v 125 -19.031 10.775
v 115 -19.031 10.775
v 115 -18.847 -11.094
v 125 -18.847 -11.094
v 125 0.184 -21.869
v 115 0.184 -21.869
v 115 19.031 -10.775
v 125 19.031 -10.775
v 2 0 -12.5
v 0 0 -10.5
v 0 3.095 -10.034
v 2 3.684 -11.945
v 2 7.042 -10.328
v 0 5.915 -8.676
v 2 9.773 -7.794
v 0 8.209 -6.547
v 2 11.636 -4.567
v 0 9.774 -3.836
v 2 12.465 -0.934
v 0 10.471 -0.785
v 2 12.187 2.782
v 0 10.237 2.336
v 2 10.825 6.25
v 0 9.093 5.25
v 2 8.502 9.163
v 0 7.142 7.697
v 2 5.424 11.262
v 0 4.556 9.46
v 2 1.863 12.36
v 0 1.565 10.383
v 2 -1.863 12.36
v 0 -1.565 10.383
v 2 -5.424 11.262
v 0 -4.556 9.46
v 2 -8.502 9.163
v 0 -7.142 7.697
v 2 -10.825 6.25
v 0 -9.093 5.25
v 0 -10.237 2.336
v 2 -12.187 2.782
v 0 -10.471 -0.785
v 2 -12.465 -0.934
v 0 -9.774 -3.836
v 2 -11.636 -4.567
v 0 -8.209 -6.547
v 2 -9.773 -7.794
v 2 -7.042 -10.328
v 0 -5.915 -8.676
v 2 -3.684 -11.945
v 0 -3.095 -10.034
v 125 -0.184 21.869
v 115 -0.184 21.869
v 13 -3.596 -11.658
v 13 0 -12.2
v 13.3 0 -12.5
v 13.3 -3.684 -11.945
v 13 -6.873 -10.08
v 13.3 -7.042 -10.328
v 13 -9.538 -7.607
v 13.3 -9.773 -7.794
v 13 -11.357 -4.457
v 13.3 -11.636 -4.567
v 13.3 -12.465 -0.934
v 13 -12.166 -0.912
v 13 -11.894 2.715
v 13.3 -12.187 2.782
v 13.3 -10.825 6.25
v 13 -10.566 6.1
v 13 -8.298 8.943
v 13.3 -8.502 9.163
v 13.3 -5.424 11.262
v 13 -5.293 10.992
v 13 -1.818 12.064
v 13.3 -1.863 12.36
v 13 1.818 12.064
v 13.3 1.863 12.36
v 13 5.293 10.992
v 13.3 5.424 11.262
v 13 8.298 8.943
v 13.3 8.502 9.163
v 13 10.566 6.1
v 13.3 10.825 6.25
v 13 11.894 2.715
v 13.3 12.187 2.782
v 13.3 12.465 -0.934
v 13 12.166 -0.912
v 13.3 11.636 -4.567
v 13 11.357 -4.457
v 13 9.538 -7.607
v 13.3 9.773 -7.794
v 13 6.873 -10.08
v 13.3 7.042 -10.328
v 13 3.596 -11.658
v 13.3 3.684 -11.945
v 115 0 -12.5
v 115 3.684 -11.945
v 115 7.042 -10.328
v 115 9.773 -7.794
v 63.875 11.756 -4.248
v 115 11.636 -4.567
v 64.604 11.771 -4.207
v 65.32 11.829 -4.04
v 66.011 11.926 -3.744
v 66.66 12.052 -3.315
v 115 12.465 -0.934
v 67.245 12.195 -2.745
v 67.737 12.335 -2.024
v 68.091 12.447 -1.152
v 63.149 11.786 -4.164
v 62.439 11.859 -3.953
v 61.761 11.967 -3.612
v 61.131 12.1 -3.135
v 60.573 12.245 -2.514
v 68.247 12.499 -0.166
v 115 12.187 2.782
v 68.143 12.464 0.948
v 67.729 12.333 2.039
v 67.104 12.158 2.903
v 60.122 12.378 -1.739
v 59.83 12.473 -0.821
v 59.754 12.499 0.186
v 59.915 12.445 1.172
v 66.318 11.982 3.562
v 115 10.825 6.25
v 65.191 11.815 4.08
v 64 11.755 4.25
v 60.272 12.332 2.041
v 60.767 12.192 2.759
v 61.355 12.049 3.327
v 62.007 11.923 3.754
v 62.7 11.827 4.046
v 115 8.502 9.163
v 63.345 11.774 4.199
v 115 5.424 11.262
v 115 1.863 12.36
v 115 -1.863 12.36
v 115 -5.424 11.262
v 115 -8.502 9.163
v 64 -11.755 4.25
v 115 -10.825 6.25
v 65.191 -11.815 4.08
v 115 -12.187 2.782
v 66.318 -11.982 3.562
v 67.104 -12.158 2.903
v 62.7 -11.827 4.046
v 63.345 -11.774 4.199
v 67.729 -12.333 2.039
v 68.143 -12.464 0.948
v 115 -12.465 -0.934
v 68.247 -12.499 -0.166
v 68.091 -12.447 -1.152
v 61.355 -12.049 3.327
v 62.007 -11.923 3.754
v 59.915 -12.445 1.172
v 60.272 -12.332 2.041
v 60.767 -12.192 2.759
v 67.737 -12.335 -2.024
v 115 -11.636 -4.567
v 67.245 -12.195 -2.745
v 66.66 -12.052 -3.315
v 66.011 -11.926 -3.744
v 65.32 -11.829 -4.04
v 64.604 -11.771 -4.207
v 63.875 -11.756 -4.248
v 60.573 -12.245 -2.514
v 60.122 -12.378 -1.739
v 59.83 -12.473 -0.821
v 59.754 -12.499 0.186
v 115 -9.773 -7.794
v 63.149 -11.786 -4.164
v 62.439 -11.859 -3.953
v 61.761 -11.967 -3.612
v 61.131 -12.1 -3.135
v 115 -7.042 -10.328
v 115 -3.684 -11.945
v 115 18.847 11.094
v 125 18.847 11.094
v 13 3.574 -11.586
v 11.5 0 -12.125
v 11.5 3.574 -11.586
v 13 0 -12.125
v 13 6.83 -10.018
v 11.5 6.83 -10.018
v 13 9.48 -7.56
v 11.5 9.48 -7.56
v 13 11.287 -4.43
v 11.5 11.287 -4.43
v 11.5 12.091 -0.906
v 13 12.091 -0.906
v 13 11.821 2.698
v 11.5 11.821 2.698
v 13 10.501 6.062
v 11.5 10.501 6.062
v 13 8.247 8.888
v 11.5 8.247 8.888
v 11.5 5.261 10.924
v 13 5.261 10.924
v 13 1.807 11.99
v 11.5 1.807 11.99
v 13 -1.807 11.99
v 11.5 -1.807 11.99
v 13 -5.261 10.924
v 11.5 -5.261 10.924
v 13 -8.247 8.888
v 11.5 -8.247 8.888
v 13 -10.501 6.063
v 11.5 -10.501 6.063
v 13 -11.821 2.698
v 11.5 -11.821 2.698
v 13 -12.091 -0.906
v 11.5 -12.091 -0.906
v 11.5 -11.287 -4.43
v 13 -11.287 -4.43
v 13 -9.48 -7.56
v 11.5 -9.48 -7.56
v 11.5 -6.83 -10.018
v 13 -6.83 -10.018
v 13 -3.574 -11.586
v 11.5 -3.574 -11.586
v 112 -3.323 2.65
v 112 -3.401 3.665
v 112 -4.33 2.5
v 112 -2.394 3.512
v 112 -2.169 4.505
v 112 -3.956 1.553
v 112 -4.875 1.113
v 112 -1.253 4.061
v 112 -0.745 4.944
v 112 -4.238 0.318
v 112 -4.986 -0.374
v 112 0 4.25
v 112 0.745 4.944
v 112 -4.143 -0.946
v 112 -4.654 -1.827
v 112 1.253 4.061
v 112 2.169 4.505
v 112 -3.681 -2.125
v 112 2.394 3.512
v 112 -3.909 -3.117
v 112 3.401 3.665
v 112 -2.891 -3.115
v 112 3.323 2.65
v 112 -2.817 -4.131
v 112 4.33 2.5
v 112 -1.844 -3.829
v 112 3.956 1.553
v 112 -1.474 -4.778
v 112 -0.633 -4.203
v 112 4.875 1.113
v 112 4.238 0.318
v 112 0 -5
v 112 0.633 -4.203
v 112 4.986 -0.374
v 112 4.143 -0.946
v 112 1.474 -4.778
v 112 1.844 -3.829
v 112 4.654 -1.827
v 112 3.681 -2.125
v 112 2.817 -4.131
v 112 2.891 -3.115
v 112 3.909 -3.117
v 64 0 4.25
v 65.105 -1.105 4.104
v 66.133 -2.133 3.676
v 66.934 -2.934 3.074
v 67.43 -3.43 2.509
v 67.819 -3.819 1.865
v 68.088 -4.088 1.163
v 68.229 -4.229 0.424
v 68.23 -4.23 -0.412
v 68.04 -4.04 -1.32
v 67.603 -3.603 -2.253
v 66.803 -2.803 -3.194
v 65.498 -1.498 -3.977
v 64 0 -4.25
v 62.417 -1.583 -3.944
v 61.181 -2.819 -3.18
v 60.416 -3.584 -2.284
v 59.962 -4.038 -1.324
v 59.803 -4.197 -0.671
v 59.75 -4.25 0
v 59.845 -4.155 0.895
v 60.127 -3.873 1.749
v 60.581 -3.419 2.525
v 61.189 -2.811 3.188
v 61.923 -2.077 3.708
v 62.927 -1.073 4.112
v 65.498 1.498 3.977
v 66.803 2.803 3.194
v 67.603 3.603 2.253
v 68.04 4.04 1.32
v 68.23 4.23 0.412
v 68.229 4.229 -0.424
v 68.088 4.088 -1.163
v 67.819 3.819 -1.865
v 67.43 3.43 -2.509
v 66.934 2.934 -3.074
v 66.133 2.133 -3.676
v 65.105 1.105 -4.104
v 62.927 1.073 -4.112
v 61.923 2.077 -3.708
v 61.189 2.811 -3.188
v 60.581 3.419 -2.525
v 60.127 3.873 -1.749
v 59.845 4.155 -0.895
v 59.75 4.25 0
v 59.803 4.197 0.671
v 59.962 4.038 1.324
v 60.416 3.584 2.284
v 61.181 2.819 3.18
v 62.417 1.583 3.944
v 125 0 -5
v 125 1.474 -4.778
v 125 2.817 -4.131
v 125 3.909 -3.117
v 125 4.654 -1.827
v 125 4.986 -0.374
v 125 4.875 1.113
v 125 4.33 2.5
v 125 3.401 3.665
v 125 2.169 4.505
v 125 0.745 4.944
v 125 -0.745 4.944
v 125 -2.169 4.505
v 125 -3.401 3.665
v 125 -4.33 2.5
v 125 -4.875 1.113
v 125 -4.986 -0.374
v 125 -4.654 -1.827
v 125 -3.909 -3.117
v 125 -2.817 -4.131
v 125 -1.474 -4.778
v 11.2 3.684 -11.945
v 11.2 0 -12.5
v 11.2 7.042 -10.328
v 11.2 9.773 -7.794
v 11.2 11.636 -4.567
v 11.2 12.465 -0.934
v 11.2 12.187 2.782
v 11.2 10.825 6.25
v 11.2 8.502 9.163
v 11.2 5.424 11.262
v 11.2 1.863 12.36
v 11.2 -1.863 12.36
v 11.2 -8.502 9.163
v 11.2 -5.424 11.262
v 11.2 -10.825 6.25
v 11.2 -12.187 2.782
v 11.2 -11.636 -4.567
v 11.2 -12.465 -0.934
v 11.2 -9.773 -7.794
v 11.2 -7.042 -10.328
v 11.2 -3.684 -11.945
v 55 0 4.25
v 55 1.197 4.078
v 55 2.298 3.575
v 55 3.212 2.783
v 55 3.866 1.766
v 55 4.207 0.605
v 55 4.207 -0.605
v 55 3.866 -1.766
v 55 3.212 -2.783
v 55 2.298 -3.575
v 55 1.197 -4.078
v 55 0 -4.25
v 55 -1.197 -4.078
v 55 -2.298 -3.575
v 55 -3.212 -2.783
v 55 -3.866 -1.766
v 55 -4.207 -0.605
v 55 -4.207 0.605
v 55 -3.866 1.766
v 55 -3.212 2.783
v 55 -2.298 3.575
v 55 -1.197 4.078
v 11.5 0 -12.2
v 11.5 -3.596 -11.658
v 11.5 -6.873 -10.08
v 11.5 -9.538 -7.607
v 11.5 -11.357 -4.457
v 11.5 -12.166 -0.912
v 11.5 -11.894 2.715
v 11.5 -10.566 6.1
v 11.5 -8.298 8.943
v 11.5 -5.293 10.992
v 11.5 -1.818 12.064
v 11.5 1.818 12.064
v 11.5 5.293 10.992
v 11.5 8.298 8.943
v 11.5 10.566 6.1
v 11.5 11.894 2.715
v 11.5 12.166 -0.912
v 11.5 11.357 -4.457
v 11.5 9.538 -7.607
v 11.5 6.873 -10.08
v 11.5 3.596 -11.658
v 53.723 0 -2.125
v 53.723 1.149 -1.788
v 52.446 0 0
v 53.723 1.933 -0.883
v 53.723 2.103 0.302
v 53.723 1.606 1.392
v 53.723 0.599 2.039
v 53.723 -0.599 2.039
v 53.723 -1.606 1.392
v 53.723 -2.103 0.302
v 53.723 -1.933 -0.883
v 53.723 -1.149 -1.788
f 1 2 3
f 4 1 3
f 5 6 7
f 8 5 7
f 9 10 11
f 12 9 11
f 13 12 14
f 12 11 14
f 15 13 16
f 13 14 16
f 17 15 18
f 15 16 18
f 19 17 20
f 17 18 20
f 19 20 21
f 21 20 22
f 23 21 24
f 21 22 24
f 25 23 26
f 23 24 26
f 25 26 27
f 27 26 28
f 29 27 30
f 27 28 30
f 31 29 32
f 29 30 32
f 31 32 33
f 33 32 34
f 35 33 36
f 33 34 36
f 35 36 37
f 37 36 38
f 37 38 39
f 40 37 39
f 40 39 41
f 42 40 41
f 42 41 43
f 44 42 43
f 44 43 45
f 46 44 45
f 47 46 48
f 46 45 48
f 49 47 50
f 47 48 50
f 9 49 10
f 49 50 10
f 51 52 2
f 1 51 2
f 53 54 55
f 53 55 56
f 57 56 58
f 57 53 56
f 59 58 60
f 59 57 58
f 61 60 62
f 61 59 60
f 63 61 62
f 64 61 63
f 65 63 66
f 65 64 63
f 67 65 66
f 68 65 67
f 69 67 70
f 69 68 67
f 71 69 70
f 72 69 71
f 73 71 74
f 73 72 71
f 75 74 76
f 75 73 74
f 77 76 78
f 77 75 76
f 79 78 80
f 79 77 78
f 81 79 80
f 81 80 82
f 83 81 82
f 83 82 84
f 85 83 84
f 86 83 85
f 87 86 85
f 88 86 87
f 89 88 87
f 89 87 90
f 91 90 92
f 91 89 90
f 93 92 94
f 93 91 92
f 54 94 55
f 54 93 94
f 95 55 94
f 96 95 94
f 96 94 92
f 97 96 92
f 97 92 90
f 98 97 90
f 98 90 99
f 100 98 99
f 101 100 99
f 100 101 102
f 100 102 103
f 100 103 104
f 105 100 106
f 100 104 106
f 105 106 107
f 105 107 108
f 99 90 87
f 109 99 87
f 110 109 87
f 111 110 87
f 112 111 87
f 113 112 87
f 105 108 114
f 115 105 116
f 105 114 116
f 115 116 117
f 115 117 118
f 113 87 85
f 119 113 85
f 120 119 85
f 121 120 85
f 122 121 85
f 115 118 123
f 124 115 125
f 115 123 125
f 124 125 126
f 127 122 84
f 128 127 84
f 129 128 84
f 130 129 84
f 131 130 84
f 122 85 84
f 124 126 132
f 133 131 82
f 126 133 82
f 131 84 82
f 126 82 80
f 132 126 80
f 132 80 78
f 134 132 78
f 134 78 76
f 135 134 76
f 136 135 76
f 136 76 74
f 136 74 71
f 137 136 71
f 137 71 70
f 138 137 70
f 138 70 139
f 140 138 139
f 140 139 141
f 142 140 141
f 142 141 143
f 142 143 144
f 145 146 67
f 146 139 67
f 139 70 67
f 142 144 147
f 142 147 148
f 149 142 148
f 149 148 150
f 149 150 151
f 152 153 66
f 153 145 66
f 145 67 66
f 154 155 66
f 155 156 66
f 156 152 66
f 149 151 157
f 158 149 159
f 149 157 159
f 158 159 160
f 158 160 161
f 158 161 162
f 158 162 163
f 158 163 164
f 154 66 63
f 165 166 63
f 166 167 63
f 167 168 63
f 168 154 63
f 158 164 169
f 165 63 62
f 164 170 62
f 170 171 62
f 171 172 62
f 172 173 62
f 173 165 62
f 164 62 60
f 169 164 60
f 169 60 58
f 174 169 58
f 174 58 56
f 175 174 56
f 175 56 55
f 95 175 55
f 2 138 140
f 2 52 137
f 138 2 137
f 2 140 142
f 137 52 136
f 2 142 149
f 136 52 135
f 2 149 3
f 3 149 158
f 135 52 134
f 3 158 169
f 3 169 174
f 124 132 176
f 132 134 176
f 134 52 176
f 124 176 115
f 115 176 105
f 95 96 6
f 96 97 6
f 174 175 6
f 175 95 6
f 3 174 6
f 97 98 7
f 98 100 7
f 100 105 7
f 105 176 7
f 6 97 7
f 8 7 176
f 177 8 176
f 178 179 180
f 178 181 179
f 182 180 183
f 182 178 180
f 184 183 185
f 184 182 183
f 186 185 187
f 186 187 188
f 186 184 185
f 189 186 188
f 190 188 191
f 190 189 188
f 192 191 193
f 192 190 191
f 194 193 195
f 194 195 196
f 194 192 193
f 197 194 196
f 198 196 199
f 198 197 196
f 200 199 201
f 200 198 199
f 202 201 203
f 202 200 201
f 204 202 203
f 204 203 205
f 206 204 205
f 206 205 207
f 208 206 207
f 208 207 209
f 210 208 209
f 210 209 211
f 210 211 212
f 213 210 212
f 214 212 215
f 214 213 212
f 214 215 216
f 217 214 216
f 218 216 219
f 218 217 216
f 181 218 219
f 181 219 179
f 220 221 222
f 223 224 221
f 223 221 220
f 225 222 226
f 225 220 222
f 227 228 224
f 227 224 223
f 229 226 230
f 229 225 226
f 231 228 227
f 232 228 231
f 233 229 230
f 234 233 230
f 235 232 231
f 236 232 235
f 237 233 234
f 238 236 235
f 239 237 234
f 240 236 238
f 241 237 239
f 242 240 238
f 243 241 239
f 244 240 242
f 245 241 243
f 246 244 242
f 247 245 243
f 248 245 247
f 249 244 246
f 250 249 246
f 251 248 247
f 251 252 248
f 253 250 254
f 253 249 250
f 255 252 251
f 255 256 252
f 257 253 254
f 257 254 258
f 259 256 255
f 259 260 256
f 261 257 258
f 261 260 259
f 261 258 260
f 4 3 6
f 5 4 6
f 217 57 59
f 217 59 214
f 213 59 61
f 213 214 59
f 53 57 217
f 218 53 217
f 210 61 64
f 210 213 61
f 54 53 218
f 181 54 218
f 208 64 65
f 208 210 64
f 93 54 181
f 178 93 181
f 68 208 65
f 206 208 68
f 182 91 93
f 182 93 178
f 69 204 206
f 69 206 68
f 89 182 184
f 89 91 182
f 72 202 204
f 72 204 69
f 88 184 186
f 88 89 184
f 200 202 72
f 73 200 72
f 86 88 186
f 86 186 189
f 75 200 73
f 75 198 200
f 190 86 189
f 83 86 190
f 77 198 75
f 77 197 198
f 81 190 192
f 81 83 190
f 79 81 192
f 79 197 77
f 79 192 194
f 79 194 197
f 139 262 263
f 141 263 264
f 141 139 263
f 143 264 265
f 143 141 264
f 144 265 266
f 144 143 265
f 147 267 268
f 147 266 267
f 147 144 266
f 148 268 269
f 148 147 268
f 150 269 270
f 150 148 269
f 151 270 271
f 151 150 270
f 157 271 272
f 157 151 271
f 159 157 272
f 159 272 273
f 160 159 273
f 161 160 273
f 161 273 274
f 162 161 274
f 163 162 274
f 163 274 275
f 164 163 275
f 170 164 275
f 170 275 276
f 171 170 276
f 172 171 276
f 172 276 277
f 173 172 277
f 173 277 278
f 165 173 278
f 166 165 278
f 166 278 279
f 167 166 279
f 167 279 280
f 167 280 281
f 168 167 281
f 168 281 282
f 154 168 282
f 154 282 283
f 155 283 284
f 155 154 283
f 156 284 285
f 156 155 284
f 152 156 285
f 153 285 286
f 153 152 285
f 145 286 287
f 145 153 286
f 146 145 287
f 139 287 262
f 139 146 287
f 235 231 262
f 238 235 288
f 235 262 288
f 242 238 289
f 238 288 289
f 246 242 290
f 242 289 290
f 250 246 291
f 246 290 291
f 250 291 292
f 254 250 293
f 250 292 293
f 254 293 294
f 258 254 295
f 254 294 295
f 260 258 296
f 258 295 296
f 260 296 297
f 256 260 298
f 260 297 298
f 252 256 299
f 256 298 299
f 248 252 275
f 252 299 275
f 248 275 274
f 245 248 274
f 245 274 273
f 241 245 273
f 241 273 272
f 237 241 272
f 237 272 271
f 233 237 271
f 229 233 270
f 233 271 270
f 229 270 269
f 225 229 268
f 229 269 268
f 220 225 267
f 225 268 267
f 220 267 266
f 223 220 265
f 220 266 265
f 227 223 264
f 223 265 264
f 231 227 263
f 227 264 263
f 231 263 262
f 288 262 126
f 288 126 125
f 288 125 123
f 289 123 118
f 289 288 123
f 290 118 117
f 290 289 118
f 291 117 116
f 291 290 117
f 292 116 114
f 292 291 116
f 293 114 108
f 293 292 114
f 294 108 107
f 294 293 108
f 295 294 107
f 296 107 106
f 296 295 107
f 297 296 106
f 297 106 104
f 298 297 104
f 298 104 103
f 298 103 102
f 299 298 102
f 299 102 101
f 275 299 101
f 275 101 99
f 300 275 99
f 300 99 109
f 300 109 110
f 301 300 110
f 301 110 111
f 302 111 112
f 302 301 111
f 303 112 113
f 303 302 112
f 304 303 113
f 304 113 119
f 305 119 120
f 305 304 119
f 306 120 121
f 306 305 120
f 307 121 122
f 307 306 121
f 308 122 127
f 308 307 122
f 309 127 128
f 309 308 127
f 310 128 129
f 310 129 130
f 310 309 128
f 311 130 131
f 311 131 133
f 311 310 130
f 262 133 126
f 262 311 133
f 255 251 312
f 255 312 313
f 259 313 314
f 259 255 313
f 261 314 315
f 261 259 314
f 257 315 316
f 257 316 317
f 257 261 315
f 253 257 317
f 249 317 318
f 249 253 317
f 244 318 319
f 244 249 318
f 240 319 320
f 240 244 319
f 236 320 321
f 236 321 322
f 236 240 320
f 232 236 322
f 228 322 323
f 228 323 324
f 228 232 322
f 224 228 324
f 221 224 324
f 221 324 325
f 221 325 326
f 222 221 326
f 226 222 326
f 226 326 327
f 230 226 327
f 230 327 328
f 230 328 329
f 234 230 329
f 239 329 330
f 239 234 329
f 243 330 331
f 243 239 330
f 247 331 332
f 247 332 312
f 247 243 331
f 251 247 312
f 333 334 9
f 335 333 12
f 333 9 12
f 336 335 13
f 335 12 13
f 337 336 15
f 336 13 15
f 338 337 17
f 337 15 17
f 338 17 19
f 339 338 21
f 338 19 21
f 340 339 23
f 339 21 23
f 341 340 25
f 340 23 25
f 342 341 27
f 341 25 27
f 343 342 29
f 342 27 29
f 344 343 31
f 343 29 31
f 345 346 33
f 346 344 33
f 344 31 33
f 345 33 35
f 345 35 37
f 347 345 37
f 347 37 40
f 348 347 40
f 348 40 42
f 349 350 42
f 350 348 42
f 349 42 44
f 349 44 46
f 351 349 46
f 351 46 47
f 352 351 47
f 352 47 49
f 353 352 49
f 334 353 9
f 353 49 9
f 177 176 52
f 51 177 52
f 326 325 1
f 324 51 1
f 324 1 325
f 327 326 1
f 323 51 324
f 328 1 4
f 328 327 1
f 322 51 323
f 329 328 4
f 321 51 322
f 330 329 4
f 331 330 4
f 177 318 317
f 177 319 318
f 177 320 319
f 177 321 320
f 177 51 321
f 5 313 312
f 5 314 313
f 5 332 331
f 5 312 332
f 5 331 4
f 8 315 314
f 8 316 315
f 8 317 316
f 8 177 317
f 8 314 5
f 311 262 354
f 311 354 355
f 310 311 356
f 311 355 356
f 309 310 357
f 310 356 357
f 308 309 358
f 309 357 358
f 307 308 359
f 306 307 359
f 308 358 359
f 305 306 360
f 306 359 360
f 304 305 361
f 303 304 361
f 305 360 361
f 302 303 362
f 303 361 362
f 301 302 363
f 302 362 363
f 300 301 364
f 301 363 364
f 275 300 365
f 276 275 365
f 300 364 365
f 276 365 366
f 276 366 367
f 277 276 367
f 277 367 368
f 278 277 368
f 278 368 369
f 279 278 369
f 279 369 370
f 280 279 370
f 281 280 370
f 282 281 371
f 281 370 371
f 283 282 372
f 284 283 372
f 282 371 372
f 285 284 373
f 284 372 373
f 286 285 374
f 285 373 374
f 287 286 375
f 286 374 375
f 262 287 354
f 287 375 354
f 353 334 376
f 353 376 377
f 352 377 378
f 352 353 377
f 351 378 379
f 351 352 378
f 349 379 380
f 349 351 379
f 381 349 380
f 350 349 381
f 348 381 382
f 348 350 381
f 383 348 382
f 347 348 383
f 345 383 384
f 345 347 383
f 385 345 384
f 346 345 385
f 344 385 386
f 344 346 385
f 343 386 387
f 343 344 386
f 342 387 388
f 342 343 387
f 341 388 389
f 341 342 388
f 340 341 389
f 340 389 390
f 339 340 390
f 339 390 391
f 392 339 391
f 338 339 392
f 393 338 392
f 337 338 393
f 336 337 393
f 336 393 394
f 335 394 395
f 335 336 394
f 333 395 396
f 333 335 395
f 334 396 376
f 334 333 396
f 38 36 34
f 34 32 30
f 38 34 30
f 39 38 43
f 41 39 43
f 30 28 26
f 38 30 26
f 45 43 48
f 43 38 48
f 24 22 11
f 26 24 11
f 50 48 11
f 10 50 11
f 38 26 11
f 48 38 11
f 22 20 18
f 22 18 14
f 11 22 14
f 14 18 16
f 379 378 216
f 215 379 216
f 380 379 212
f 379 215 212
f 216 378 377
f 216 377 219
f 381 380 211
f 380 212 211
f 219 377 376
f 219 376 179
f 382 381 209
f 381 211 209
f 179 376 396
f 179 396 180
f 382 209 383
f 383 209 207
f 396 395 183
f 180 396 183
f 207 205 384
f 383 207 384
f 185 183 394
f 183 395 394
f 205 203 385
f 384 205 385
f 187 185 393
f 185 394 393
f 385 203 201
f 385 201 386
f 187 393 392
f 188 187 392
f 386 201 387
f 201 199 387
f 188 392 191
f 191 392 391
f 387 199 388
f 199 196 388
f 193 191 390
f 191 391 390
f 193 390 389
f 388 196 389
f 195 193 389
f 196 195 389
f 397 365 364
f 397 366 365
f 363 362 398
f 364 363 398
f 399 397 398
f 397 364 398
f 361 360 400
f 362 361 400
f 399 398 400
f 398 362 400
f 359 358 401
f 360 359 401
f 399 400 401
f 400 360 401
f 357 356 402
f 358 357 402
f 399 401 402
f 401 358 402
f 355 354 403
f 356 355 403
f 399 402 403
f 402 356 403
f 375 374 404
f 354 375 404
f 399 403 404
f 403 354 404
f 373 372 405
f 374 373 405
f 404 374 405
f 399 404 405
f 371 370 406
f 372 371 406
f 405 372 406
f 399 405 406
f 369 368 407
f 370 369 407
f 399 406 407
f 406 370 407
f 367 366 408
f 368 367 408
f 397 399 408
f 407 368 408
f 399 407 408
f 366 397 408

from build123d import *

# Parameters (mm, degrees)
SKETCH1_R                 = 12.5
BOSS_EXTRUDE1_DEPTH       = 115
CHAMFER1_SIZE             = 2
BOSS_EXTRUDE2_DEPTH       = 10
F_8_0MM_DOWEL_HOLE1_D     = 8.5
F_8_0MM_DOWEL_HOLE1_DEPTH = 70
F_8_0MM_DOWEL_HOLE1_TIP   = 2.553657631
CUT_EXTRUDE1_START        = -13
SKETCH7_R                 = 5
SKETCH7_R_2               = 4.25
CUT_EXTRUDE1_DEPTH        = 13
CUT_EXTRUDE2_DEPTH        = 129.317659161
CUT_EXTRUDE2_DEPTH_BACK   = 129.317659161
SKETCH10_R                = 4.25
SKETCH11_W                = 1.5
SKETCH11_H                = 4.762269722
CHAMFER2_SIZE             = 0.3
CHAMFER3_SIZE             = 0.3


with BuildPart() as part:
    # Sketch1 → Boss-Extrude1 (new body)
    with BuildSketch(Plane(origin=(0, 0, 0), x_dir=(0, 0, -1), z_dir=(1, 0, 0))):
        Circle(SKETCH1_R)
    extrude(amount=BOSS_EXTRUDE1_DEPTH)

    # Chamfer1
    chamfer1_edges = [part.edges().sort_by_distance(p)[0] for p in [
        (0, 0, 12.5),
    ]]
    chamfer(chamfer1_edges, length=CHAMFER1_SIZE)

    # Sketch3 → Boss-Extrude2 (add)
    with BuildSketch(Plane(origin=(115, 0, 0), x_dir=(0, 0, -1), z_dir=(1, 0, 0))):
        Polygon((11.093502405, -18.847185944), (21.86889302, 0.183661927), (10.775390615, 19.030847871), (-11.093502405, 18.847185944), (-21.86889302, -0.183661927), (-10.775390615, -19.030847871), align=None)
    extrude(amount=BOSS_EXTRUDE2_DEPTH)

    # Ø8.0mm Dowel Hole1
    with Locations(Plane(origin=(125, 0, 0), x_dir=(0, 0, -1), z_dir=(1, 0, 0))):
        with Locations((0, 0)):
            Hole(F_8_0MM_DOWEL_HOLE1_D / 2, depth=F_8_0MM_DOWEL_HOLE1_DEPTH)
            with Locations((0, 0, -(F_8_0MM_DOWEL_HOLE1_DEPTH + F_8_0MM_DOWEL_HOLE1_TIP / 2))):  # 118° drill point
                Cone(0, F_8_0MM_DOWEL_HOLE1_D / 2, F_8_0MM_DOWEL_HOLE1_TIP, mode=Mode.SUBTRACT)

    # Sketch7 → Cut-Extrude1 (cut)
    with BuildSketch(Plane(origin=(125, 0, 0), x_dir=(0, 0, -1), z_dir=(1, 0, 0)).offset(CUT_EXTRUDE1_START)):
        Circle(SKETCH7_R)
        Circle(SKETCH7_R_2, mode=Mode.SUBTRACT)
    extrude(amount=CUT_EXTRUDE1_DEPTH, mode=Mode.SUBTRACT)

    # Sketch10 → Cut-Extrude2 (cut, two sides: drawn at the far end of the back side and taken through both)
    with BuildSketch(Plane(origin=(0, 0, 0), x_dir=(1, 0, 0), z_dir=(0, 1, 0)).offset(-CUT_EXTRUDE2_DEPTH_BACK)):
        with Locations(Location((64, 0, 0), (0, 0, 270))):
            Circle(SKETCH10_R)
    extrude(amount=CUT_EXTRUDE2_DEPTH + CUT_EXTRUDE2_DEPTH_BACK, mode=Mode.SUBTRACT)

    # Sketch11 → Cut-Revolve3 (revolve, cut)
    with BuildSketch(Plane.XY, mode=Mode.PRIVATE) as cut_revolve3_sk:
        with Locations((12.25, 14.506134861)):
            Rectangle(SKETCH11_W, SKETCH11_H)
    revolve(cut_revolve3_sk.sketch.rotate(Axis((-5.779414499, 0, 0), (1, 0, 0)), 270), axis=Axis((-5.779414499, 0, 0), (1, 0, 0)), mode=Mode.SUBTRACT)

    # Chamfer2
    chamfer2_edges = [part.edges().sort_by_distance(p)[0] for p in [
        (13, 0, 12.5),
    ]]
    chamfer(chamfer2_edges, length=CHAMFER2_SIZE)

    # Chamfer3
    chamfer3_edges = [part.edges().sort_by_distance(p)[0] for p in [
        (11.5, 0, 12.5),
    ]]
    chamfer(chamfer3_edges, length=CHAMFER3_SIZE)


solid = part.part
